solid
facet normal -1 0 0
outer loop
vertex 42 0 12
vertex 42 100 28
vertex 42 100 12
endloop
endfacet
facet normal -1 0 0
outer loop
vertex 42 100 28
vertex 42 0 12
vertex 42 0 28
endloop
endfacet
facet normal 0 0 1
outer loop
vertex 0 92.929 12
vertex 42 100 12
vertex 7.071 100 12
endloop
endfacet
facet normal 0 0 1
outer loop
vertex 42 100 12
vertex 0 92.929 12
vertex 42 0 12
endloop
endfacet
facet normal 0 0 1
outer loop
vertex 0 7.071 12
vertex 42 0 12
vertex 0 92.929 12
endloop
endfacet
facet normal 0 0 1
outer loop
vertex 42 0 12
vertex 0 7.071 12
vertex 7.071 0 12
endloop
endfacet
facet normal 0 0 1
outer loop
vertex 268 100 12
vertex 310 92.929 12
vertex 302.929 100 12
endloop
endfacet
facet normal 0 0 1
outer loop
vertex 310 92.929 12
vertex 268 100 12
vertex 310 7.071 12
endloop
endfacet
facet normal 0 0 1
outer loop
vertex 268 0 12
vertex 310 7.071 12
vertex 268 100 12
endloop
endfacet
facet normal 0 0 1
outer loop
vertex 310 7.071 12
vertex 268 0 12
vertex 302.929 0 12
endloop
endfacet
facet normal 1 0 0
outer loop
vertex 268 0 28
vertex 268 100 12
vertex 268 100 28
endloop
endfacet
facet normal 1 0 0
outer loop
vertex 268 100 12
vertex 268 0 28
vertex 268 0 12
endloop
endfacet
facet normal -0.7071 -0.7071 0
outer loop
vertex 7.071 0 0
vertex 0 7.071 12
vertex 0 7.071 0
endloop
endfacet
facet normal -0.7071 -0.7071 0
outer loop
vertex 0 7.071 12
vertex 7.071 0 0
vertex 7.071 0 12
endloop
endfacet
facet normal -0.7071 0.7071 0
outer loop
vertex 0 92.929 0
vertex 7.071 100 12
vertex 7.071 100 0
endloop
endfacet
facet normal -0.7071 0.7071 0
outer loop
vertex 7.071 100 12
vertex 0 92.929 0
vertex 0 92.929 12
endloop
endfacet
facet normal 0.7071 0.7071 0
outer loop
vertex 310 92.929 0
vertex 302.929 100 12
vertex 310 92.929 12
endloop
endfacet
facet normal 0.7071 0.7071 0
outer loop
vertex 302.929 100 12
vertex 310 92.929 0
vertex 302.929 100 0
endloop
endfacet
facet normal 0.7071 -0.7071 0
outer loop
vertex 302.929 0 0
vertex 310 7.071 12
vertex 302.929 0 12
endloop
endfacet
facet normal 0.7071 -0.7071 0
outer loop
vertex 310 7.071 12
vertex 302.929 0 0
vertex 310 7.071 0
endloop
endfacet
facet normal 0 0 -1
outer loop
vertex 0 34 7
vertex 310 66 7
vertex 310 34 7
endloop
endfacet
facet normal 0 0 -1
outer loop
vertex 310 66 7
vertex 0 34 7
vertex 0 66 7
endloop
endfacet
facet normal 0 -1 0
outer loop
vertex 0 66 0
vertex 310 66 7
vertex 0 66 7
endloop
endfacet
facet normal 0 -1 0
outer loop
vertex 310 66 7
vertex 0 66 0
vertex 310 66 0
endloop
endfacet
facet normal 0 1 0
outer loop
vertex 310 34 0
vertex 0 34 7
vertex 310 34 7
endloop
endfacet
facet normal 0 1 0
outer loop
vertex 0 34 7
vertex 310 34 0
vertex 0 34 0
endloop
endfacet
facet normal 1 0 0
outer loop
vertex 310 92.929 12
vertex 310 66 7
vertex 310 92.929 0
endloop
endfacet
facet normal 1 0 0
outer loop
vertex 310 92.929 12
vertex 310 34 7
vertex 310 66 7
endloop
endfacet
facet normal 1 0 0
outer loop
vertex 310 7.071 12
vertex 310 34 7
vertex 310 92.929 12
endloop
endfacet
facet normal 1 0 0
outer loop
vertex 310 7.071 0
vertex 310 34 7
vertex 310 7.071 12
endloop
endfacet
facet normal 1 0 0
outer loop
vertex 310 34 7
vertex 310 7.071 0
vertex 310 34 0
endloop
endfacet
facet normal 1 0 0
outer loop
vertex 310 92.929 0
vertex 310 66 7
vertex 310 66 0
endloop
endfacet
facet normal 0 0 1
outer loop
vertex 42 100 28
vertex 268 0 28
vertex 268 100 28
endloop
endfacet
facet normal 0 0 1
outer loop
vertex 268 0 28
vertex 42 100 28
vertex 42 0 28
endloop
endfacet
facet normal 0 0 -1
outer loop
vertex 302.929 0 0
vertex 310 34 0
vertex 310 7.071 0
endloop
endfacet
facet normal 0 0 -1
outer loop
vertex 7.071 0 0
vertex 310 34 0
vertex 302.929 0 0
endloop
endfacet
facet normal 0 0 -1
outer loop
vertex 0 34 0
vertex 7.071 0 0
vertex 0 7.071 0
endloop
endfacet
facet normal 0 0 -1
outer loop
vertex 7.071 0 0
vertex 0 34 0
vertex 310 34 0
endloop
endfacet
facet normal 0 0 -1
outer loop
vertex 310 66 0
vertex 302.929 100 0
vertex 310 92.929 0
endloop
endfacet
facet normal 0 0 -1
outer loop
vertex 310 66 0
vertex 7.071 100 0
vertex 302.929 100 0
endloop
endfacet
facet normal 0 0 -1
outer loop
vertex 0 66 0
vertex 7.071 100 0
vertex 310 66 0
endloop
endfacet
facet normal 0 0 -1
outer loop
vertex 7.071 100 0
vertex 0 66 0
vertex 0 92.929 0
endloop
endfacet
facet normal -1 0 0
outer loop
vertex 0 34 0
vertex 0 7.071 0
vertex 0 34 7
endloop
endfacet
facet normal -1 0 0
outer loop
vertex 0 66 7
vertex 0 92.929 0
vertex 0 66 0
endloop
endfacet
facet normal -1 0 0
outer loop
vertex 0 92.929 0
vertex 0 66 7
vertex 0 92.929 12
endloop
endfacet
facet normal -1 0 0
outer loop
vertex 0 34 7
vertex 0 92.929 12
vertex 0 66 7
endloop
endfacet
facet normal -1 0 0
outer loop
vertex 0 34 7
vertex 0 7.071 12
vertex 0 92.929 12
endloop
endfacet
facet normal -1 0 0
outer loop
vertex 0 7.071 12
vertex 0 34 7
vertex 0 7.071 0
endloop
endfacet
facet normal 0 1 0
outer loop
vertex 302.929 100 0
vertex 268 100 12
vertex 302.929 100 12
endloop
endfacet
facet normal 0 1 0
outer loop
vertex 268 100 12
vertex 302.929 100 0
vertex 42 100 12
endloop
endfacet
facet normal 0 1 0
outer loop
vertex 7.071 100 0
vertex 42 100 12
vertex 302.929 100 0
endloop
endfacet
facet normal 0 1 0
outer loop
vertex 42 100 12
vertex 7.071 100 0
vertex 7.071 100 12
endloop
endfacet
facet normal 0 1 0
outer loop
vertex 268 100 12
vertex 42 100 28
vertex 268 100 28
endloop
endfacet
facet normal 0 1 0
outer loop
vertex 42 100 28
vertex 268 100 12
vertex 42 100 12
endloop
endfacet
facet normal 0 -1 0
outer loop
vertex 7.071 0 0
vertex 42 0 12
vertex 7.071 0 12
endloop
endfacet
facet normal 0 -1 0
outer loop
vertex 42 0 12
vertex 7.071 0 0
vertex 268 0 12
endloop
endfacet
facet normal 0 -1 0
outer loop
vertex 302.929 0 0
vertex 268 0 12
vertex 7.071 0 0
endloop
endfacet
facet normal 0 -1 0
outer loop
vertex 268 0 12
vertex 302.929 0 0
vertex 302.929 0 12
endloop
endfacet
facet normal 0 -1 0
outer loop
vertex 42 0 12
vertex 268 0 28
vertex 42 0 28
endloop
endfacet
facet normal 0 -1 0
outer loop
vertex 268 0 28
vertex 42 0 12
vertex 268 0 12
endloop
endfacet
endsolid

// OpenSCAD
include <../src/wardrobe.scad>;
plank_zx_front_middle();
//github_openscad -o wardrobe_2/plank_zx_front_middle.stl -D wardrobe_n=2 -D cutting_edge=0 -D break_view_length=0 wardrobe_2/plank_zx_front_middle_stl.scad
